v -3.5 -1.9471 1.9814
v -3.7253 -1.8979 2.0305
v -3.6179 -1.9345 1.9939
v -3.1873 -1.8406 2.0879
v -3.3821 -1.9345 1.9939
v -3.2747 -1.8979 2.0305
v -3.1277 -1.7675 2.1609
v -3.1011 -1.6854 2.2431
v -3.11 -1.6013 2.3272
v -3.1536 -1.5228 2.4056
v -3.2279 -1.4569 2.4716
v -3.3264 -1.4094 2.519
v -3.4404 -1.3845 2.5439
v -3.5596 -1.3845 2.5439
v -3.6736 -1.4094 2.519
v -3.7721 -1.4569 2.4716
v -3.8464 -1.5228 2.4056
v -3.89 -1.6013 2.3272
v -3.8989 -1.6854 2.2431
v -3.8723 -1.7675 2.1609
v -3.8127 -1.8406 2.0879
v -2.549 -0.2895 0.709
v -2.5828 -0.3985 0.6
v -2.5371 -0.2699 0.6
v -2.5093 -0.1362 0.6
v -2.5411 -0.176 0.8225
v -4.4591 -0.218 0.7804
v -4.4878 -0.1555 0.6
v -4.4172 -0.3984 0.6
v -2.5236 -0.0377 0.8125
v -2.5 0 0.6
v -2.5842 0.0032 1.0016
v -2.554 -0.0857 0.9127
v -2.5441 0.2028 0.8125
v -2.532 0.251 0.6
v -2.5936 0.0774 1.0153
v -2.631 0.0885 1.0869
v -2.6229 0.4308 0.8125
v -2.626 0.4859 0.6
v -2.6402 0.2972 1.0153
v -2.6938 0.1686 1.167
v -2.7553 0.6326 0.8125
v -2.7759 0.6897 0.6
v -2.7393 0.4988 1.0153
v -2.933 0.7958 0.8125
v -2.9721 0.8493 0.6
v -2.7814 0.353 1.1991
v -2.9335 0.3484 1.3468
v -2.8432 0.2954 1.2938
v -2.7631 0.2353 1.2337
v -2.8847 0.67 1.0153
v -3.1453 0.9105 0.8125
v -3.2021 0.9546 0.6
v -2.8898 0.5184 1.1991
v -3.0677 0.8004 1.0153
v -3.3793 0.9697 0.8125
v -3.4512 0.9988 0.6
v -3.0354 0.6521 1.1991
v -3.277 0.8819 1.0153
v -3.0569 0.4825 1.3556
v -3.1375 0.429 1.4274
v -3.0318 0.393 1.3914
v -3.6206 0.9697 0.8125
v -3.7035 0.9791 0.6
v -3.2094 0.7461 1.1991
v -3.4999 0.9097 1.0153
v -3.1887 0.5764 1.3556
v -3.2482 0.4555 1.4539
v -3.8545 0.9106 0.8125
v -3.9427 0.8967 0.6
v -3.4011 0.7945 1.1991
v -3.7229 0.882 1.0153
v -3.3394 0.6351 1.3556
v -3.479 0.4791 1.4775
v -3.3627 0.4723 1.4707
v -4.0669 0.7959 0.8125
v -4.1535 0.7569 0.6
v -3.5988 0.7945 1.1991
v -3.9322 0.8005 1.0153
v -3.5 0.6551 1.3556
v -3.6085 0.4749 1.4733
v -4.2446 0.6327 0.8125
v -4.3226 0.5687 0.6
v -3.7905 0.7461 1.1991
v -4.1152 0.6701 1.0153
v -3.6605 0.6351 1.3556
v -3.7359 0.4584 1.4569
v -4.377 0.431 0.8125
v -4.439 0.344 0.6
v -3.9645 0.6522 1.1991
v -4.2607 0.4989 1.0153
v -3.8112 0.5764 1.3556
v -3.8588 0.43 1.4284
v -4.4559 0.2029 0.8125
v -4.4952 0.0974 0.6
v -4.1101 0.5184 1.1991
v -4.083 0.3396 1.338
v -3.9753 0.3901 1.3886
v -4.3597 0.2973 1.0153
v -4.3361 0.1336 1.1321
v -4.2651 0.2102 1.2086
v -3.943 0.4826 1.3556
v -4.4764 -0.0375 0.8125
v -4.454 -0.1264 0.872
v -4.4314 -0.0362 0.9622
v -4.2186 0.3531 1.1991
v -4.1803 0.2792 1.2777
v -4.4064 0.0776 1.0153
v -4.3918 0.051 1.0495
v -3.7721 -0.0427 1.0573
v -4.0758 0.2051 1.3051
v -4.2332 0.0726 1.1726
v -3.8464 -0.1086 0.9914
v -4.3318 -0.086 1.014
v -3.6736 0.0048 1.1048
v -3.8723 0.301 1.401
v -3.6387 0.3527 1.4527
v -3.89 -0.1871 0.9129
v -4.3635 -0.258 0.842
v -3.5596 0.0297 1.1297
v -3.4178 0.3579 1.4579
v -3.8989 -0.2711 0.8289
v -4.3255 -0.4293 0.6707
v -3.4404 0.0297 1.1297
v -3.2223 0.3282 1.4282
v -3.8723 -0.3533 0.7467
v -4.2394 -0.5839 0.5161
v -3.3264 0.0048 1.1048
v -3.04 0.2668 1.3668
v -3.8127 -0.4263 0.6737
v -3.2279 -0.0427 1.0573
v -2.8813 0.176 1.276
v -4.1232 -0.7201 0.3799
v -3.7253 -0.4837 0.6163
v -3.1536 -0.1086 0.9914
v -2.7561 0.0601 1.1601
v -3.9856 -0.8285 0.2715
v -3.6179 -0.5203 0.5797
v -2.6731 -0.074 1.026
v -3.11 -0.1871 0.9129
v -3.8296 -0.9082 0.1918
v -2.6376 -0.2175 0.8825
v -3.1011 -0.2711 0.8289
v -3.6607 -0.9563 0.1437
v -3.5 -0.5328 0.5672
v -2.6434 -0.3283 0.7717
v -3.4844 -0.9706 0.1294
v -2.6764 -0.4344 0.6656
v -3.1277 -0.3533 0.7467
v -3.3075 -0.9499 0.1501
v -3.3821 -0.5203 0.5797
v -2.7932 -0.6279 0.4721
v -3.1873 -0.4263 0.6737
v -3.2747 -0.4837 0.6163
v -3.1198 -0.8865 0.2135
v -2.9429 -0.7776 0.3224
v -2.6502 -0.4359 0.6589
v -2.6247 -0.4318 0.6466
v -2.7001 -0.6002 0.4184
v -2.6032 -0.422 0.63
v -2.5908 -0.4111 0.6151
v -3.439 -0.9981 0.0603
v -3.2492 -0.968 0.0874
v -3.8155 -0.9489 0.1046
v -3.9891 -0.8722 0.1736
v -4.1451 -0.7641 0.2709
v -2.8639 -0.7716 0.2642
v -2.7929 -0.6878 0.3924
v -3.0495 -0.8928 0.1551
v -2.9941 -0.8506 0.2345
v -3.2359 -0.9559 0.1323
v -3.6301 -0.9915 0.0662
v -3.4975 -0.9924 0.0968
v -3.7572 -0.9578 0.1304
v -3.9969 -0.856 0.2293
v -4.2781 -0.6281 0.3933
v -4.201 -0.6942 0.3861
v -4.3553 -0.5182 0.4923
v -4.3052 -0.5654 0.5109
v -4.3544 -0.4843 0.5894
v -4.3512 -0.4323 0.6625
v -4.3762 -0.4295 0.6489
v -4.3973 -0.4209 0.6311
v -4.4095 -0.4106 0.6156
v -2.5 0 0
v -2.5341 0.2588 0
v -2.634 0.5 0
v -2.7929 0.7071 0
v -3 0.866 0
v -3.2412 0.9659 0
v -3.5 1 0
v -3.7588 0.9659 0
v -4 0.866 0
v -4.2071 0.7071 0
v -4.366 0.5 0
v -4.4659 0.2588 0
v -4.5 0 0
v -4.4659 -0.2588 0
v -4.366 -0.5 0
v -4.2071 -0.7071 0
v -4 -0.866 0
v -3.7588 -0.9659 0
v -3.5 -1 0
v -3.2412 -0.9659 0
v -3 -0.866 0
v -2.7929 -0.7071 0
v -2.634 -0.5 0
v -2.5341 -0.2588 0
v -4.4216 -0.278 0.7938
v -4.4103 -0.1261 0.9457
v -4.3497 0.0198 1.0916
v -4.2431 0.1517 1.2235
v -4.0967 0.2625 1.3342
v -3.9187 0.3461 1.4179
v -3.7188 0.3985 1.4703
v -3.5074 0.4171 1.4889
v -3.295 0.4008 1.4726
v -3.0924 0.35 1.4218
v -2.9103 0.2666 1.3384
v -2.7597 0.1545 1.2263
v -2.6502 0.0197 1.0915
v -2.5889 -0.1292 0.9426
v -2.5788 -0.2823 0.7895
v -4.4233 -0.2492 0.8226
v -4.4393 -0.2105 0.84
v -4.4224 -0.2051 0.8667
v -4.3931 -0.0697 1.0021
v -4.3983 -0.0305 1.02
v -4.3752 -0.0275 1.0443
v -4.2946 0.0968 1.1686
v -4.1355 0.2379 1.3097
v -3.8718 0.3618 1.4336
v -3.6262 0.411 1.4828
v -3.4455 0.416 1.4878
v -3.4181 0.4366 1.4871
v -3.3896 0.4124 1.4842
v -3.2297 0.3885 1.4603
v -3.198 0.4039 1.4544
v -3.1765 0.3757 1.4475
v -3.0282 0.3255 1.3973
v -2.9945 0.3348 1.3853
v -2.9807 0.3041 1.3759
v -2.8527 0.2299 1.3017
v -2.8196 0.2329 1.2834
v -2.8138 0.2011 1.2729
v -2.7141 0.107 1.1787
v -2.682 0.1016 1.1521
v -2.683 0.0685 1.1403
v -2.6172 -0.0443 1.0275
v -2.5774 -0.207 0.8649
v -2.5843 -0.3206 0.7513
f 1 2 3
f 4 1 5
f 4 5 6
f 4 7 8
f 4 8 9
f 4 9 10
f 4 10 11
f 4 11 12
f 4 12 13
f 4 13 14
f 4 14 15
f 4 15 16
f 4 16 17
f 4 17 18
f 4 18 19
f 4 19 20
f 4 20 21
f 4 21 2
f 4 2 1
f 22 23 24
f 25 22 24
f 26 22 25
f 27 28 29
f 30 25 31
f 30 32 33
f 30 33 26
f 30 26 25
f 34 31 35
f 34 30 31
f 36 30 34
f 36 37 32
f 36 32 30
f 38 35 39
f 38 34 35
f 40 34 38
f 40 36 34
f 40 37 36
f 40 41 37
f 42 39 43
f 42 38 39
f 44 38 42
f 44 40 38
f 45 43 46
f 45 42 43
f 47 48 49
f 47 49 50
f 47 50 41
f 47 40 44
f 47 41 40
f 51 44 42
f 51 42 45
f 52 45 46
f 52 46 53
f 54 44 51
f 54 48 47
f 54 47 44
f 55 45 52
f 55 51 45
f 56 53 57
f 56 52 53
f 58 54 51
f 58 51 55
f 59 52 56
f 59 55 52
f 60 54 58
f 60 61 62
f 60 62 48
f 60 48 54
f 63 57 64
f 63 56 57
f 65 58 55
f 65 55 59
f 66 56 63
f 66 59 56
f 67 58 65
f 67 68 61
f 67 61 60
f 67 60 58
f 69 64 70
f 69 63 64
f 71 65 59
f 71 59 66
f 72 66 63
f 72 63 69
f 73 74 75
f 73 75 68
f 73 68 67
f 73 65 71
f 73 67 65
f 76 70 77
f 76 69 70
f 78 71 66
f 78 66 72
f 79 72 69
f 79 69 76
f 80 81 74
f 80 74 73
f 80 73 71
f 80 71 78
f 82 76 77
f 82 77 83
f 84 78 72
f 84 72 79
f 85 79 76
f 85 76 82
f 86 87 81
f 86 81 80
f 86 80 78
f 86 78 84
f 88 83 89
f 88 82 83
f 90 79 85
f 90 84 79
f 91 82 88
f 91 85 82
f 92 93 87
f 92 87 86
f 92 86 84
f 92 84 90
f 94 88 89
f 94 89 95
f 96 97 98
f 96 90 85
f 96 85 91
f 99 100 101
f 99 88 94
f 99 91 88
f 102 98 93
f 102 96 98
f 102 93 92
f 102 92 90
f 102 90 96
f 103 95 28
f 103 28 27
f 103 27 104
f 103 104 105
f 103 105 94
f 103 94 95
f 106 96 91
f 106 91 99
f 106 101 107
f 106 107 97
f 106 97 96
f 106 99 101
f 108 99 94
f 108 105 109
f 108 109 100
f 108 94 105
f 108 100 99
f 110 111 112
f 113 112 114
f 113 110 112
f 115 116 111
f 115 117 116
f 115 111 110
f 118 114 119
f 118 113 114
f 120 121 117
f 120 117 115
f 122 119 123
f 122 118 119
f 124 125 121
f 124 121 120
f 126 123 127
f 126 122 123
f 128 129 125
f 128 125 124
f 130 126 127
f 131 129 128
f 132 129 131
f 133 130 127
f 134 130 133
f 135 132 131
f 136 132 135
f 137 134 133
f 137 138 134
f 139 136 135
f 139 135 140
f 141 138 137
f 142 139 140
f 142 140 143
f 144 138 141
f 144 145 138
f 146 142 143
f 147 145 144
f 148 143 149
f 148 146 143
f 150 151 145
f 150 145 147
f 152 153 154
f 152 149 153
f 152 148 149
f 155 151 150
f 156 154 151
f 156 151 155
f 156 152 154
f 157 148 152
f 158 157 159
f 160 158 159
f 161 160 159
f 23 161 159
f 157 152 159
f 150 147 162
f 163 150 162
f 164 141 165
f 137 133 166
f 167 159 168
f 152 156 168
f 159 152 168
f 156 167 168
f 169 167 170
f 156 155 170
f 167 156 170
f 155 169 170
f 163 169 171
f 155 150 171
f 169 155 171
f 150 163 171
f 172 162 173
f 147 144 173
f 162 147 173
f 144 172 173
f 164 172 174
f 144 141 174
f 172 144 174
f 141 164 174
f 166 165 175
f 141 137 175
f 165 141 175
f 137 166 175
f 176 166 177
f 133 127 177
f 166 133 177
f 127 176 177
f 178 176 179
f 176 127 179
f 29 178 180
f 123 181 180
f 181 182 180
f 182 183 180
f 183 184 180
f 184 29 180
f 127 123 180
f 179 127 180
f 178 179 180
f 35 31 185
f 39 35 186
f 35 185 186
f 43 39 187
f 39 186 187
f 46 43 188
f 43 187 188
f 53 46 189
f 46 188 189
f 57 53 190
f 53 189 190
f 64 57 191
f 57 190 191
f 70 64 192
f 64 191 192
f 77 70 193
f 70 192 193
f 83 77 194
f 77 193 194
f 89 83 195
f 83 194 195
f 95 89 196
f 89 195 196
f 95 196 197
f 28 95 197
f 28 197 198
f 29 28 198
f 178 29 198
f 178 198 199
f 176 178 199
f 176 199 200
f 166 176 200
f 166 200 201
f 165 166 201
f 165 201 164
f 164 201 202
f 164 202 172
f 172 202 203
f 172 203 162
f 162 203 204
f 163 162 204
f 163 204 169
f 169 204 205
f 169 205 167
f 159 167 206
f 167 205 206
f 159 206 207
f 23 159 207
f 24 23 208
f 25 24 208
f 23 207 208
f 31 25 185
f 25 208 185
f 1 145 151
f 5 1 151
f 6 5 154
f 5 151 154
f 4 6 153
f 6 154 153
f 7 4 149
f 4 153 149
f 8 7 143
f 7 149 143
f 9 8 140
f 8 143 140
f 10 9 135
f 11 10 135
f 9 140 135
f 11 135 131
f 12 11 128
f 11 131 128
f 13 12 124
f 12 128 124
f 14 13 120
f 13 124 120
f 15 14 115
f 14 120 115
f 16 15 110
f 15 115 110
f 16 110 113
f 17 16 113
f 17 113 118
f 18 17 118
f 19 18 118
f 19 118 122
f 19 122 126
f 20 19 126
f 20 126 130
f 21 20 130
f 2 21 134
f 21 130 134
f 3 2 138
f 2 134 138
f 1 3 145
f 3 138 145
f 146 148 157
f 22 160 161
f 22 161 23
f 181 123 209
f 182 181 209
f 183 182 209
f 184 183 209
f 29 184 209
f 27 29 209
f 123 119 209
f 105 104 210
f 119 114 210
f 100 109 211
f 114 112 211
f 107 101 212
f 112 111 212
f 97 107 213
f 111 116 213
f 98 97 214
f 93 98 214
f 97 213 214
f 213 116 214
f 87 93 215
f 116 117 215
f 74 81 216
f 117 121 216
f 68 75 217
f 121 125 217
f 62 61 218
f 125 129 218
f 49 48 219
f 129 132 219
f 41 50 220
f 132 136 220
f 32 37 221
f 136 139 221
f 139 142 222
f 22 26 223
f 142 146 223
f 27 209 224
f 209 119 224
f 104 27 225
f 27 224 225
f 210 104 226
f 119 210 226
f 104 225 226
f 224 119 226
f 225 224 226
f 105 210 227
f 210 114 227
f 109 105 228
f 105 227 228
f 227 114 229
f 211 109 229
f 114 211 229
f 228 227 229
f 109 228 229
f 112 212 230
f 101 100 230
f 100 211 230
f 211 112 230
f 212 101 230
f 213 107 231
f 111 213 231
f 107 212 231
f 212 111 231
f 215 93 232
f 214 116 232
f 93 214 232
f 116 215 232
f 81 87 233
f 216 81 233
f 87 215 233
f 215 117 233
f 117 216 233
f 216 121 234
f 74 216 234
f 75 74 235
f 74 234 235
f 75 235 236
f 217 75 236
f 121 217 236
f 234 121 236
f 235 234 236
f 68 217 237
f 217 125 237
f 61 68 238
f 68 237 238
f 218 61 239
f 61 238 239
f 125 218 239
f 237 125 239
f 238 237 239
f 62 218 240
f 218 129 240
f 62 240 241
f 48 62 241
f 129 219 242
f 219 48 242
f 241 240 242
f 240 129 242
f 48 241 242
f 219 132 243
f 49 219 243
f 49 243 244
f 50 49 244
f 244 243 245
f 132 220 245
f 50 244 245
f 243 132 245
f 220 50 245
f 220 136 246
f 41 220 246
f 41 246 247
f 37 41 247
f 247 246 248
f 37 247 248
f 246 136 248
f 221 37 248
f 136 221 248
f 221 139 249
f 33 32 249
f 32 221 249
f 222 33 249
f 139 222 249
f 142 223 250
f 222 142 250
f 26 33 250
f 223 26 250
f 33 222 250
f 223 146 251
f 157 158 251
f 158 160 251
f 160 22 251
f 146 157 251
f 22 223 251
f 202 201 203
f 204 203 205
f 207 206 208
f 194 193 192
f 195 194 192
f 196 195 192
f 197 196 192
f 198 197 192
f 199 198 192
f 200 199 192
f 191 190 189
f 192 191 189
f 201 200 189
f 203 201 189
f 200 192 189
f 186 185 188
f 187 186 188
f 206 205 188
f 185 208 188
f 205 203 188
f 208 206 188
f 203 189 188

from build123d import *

# Parameters (mm, degrees)
SKETCH_2_R      = 1
EXTRUDE_1_DEPTH = 1.6
FILLET_2_R      = 1
FILLET_3_R      = 0.1
SKETCH_4_R      = 0.4
EXTRUDE_2_DEPTH = 2


# Read off the part's stored shape, not the designer's step: Тело-Удалить/Сохранить 1
with BuildPart() as part:
    # Эскиз2 → Бобышка-Вытянуть1 (new body)
    with BuildSketch(Plane.XY):
        with Locations((-3.5, 0)):
            Circle(SKETCH_2_R)
    extrude(amount=EXTRUDE_1_DEPTH)

    # Скругление2
    fillet_2_edges = [part.edges().sort_by_distance(p)[0] for p in [
        (-4.5, 0, 1.6),
    ]]
    fillet(fillet_2_edges, radius=FILLET_2_R)


with BuildPart() as body_2:
    # Split Bodies 1: the piece on the far side of the plane
    add(part.part)
    split(bisect_by=Plane(origin=(0, -0.55, 0.55), x_dir=(0, -0.7071067811865464, -0.7071067811865488), z_dir=(0, -0.7071067811865488, 0.7071067811865464)), keep=Keep.BOTTOM)

    # Скругление3
    fillet_3_edges = [body_2.edges().sort_by_distance(p)[0] for p in [
        (-3.853553391, 0.362372436, 1.462372436),
        (-3.499999994, -1, 0.1),
    ]]
    fillet(fillet_3_edges, radius=FILLET_3_R)

    # Эскиз4 → Бобышка-Вытянуть2 (add)
    with BuildSketch(Plane(origin=(0, -0.55, 0.55), x_dir=(1, 0, 0), z_dir=(0, -0.7071067811865487, 0.7071067811865465))):
        with Locations(Location((-3.5, 0.424264069, 0), (0, 0, 270))):
            Circle(SKETCH_4_R)
    extrude(amount=EXTRUDE_2_DEPTH)


with BuildPart() as part_1:
    add(part.part)

    # Split Bodies 1
    split(bisect_by=Plane(origin=(0, -0.55, 0.55), x_dir=(0, -0.7071067811865464, -0.7071067811865488), z_dir=(0, -0.7071067811865488, 0.7071067811865464)), keep=Keep.TOP)


solid = body_2.part
